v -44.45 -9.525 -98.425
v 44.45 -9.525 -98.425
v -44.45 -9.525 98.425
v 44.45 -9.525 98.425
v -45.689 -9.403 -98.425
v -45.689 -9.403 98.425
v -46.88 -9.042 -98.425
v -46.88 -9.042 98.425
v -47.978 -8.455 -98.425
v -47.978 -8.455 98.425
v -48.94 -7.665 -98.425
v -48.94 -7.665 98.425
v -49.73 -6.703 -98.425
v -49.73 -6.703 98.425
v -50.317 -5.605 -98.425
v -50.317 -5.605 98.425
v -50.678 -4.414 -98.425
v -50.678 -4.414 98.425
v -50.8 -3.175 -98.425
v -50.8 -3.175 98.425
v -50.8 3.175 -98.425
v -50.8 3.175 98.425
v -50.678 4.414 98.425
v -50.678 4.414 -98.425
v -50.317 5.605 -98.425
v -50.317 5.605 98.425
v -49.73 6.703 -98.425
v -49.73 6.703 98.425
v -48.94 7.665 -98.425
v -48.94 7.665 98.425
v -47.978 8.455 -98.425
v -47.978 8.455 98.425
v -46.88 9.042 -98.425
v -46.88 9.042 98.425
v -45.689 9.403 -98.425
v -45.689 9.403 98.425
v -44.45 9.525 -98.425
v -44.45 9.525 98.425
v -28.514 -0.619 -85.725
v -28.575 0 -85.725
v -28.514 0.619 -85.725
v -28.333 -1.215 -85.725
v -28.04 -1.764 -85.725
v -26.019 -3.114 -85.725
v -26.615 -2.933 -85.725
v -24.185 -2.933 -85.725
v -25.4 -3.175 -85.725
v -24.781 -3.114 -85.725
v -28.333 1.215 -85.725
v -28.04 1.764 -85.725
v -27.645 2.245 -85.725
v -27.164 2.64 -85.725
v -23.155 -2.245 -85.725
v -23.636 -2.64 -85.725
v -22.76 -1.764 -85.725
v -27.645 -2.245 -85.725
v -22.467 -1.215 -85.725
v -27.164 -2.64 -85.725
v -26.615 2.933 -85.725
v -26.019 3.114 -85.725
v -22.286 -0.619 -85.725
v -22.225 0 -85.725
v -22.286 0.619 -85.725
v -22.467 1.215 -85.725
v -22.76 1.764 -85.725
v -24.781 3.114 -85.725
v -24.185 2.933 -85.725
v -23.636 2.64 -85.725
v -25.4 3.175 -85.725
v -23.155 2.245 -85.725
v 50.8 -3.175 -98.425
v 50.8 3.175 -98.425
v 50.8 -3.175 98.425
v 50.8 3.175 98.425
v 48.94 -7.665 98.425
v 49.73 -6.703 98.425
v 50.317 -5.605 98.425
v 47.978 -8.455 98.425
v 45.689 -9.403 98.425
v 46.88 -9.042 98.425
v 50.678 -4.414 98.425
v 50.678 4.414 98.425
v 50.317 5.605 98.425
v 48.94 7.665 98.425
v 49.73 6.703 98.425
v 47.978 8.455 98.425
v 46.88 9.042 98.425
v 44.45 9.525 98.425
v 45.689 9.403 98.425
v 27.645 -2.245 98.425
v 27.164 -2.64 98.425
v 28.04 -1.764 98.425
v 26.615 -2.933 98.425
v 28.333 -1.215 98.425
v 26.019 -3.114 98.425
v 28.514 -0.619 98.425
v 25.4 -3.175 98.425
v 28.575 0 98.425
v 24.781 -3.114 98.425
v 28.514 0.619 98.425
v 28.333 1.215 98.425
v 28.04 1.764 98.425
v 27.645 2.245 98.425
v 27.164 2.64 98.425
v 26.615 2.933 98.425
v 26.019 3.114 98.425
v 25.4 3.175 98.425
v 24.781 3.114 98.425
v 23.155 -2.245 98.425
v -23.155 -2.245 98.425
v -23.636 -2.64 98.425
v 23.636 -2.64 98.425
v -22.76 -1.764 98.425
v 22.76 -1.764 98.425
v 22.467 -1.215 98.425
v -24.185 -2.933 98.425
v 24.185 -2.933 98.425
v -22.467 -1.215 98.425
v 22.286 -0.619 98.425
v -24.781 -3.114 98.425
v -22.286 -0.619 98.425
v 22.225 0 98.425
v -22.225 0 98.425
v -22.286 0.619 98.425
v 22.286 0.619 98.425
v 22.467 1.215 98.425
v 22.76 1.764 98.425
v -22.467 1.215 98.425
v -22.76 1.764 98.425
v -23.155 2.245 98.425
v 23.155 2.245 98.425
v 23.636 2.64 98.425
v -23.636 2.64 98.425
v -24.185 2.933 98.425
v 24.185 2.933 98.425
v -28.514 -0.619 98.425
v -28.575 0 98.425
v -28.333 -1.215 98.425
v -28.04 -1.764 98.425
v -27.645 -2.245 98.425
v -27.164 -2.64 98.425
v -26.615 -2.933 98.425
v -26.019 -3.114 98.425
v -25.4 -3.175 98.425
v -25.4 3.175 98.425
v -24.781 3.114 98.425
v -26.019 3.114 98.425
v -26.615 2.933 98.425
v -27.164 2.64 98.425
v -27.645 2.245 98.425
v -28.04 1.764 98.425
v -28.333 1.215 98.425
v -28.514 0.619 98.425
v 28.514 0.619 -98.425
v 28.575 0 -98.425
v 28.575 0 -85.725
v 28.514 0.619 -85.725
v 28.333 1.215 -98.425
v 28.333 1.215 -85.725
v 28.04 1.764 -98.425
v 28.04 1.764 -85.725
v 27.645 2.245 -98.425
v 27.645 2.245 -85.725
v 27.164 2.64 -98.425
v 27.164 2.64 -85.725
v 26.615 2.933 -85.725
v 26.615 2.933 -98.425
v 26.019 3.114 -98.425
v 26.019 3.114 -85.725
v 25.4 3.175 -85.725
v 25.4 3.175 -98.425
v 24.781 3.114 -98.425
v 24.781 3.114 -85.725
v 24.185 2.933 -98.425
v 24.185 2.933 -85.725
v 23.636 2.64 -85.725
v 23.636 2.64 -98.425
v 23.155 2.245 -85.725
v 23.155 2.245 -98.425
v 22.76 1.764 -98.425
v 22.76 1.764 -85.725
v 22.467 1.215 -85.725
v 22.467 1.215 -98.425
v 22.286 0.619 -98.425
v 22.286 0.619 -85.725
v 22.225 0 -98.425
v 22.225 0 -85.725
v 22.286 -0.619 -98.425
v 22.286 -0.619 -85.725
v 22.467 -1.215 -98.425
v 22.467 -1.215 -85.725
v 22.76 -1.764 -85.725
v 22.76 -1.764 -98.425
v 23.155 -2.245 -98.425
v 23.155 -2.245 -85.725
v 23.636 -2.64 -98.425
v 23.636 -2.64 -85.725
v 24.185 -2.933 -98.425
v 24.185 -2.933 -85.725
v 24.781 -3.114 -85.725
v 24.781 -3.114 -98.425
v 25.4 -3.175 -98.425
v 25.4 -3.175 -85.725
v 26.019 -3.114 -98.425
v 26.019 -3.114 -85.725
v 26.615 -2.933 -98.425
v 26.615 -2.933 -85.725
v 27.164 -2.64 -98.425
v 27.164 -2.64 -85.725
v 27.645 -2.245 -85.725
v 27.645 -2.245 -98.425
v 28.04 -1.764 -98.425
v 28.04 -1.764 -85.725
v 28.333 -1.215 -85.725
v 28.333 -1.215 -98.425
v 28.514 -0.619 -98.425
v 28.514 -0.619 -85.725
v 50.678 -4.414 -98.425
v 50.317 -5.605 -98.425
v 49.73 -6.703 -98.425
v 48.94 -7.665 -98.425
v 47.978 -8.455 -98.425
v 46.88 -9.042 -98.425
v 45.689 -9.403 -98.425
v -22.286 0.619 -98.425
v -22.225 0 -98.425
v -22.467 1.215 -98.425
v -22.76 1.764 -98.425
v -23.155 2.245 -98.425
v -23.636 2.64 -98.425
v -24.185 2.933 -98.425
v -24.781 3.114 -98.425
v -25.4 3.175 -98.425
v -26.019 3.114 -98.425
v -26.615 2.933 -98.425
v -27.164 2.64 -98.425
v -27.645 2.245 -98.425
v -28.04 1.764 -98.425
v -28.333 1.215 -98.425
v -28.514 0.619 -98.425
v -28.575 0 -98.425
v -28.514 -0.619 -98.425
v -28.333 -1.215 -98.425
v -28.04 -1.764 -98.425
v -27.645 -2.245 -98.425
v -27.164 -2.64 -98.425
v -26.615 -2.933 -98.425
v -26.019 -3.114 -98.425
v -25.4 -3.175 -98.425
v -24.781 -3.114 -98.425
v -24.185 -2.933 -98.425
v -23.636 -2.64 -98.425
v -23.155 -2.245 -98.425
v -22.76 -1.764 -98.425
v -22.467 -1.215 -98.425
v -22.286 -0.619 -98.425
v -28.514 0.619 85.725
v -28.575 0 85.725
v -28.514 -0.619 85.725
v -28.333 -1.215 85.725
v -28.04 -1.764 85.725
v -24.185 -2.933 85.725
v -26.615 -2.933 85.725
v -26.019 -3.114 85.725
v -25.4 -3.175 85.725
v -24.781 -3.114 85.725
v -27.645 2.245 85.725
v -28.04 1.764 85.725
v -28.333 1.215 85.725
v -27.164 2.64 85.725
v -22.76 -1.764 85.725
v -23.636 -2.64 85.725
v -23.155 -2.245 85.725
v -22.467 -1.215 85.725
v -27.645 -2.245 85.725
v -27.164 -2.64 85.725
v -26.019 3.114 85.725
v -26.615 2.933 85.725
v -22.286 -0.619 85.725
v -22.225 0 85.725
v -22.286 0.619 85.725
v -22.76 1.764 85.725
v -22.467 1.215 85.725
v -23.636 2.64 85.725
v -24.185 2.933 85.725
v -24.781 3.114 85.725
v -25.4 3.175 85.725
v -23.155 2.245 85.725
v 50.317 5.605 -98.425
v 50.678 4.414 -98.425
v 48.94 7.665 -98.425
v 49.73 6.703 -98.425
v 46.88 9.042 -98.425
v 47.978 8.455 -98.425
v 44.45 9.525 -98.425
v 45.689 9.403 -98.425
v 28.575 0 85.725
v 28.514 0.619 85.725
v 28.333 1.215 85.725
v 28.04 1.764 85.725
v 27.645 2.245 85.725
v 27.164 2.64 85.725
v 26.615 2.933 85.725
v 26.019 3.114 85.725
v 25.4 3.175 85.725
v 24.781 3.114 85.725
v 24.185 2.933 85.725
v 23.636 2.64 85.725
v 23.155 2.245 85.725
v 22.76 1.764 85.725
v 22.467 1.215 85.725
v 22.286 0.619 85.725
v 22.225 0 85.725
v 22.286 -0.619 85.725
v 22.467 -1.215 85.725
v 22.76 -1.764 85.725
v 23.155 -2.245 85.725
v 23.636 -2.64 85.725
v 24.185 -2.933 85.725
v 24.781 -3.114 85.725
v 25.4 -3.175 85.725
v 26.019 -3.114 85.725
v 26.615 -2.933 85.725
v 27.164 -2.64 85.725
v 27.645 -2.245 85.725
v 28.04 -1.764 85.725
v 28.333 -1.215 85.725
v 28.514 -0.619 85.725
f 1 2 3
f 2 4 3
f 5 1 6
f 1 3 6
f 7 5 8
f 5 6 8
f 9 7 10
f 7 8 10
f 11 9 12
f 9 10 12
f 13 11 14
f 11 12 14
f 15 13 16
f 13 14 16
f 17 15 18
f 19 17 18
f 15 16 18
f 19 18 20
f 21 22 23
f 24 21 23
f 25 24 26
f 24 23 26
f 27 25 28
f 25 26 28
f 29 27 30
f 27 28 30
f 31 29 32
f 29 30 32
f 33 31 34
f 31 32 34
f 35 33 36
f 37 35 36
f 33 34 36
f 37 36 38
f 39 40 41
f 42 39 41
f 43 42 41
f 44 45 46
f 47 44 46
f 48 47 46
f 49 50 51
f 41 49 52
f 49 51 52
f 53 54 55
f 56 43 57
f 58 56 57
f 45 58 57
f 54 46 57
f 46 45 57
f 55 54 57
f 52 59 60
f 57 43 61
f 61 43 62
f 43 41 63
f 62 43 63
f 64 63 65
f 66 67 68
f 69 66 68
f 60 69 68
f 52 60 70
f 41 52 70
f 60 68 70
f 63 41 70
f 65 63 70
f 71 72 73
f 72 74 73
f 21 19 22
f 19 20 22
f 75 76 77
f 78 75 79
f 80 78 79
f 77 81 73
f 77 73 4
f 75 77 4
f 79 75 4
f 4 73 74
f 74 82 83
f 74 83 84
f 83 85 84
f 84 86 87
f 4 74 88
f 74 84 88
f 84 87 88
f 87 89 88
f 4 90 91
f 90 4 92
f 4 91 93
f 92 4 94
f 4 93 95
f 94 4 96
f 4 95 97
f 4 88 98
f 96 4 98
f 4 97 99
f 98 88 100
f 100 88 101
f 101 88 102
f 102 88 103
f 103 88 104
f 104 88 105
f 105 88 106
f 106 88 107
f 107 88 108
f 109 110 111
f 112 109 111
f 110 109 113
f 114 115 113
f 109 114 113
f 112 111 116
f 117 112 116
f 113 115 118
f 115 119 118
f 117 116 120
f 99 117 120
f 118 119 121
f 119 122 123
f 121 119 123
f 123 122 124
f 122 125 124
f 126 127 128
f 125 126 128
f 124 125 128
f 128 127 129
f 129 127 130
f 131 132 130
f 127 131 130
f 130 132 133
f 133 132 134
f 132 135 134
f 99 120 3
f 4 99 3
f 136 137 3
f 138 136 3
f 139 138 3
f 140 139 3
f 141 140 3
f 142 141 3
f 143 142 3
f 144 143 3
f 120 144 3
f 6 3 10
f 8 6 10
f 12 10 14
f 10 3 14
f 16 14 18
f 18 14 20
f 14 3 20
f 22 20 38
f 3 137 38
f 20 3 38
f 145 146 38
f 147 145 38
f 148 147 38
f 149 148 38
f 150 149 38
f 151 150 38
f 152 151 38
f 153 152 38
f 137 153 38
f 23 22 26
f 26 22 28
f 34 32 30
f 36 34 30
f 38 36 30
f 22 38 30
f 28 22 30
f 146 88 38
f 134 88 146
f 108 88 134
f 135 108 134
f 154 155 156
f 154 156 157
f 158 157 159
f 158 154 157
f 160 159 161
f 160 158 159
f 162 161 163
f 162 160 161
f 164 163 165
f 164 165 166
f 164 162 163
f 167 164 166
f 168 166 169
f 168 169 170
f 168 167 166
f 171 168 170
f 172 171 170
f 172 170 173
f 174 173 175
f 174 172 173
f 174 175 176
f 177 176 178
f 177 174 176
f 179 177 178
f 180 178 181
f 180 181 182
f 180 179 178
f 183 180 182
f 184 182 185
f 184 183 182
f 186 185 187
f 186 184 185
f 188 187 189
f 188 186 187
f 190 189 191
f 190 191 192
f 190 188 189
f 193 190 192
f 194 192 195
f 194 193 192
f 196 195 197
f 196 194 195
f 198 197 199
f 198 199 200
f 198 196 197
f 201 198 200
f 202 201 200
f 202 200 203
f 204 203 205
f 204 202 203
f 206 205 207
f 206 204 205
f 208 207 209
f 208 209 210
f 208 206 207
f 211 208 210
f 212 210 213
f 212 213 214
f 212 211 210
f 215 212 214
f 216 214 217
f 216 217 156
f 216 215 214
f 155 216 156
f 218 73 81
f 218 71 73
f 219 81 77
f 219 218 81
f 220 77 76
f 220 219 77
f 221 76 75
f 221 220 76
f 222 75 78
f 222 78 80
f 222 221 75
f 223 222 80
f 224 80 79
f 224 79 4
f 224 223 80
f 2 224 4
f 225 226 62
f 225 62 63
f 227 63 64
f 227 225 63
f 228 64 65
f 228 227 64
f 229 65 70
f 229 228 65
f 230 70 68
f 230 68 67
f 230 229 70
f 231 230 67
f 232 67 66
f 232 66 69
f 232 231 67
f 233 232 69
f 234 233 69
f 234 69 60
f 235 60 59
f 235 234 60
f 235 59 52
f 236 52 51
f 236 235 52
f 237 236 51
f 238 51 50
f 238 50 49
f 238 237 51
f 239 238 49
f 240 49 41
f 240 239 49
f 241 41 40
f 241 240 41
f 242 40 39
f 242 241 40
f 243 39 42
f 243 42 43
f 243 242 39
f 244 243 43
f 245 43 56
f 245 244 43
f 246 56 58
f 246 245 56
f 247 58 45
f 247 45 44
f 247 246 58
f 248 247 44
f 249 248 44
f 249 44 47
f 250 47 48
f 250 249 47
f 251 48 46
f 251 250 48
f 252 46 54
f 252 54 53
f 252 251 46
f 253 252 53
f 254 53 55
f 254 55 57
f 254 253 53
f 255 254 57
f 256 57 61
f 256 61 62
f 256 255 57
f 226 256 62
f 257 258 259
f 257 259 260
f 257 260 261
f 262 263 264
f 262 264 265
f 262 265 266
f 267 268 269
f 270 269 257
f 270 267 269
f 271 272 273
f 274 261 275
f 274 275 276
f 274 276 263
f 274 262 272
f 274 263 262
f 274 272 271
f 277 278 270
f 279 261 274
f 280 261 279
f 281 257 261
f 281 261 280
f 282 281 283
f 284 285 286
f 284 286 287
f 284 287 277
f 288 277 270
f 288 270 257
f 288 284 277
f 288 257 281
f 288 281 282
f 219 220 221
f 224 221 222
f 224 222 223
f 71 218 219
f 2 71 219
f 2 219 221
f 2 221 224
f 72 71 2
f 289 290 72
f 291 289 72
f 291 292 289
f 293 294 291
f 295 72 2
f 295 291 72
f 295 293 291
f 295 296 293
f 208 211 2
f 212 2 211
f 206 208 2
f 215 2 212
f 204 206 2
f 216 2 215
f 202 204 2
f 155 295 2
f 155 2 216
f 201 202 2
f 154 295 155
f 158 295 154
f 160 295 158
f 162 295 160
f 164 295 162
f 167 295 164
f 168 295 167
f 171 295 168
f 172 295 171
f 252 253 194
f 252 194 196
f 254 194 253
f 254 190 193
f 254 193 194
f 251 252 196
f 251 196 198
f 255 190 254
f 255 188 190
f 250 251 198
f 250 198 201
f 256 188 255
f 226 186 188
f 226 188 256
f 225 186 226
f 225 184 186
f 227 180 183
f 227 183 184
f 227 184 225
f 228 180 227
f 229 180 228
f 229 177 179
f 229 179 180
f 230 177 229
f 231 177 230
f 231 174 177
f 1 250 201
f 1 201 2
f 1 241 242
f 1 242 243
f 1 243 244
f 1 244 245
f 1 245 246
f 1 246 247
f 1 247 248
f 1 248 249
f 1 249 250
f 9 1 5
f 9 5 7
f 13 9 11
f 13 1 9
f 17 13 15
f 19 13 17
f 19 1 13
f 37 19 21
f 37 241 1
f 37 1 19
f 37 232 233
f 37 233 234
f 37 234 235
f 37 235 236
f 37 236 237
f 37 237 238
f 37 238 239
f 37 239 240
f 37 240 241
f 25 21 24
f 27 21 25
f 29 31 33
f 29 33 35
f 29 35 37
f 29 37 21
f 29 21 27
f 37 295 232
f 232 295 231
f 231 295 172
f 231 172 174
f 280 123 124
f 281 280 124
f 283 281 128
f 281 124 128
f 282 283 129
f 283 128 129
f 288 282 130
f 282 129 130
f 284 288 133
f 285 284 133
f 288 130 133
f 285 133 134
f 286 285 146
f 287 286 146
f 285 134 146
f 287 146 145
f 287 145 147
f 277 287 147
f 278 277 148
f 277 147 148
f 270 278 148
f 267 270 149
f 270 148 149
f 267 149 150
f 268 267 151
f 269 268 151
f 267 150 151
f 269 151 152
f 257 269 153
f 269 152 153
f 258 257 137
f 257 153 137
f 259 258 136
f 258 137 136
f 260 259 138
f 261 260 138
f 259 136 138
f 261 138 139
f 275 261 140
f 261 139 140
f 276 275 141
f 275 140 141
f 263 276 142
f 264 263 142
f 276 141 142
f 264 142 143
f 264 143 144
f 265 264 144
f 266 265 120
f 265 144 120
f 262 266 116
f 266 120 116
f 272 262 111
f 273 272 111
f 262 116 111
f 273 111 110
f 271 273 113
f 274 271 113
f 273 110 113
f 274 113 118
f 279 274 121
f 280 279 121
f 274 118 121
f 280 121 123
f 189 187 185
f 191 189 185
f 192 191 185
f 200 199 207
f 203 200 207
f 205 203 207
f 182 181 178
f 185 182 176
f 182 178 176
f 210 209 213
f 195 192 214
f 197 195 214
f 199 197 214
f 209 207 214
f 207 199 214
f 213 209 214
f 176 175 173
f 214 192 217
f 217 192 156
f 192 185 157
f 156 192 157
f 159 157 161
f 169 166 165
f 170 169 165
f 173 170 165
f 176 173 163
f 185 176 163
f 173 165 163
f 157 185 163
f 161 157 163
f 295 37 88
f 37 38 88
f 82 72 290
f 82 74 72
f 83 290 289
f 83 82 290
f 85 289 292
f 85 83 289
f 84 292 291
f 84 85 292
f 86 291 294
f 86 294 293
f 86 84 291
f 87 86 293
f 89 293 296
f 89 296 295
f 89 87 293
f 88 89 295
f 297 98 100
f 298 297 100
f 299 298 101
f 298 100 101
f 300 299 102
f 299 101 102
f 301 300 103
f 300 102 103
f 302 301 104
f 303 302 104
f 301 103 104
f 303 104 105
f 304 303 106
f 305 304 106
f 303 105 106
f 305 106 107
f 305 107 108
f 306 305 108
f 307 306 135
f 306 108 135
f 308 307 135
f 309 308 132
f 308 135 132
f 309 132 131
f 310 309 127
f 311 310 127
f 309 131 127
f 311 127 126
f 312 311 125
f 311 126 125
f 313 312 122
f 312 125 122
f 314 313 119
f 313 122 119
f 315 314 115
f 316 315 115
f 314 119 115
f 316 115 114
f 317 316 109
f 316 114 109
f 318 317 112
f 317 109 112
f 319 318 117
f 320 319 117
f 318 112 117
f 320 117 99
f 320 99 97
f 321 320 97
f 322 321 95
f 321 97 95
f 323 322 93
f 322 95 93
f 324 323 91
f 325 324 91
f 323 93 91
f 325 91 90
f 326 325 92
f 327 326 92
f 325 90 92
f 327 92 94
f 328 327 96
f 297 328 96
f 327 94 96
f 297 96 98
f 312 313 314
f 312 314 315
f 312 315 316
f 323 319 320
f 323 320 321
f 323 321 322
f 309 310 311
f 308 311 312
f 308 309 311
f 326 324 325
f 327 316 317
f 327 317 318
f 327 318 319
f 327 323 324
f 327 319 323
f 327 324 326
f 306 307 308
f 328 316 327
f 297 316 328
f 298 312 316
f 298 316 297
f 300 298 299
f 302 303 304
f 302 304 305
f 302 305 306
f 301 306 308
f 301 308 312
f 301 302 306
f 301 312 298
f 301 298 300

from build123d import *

# Parameters (mm, degrees)
BOSS_EXTRUDE1_DEPTH = 98.425
SKETCH2_R           = 3.175
CUT_EXTRUDE1_DEPTH  = 12.7
FILLET1_R           = 6.35


with BuildPart() as part:
    # Sketch1 → Boss-Extrude1 (new body, symmetric)
    with BuildSketch(Plane.XY):
        with BuildLine():
            Line((44.45, 9.525), (50.8, 9.525))
            Line((50.8, 9.525), (50.8, 3.175))
            Line((50.8, 3.175), (50.8, -3.175))
            Line((50.8, -3.175), (50.8, -9.525))
            Line((50.8, -9.525), (44.45, -9.525))
            Line((44.45, -9.525), (-44.45, -9.525))
            ThreePointArc((-44.45, -9.525), (-48.940128061, -7.665128061), (-50.8, -3.175))
            Line((-50.8, -3.175), (-50.8, 3.175))
            ThreePointArc((-50.8, 3.175), (-48.940128061, 7.665128061), (-44.45, 9.525))
            Line((-44.45, 9.525), (44.45, 9.525))
        make_face()
    extrude(amount=BOSS_EXTRUDE1_DEPTH, both=True)

    # Sketch2 → Cut-Extrude1 (cut)
    with BuildSketch(Plane.XY.offset(98.425)):
        with Locations((-25.4, 0)):
            Circle(SKETCH2_R)
        with Locations((25.4, 0)):
            Circle(SKETCH2_R)
    cut_extrude1 = extrude(amount=-CUT_EXTRUDE1_DEPTH, mode=Mode.SUBTRACT)

    # Fillet1
    fillet1_edges = [part.edges().sort_by_distance(p)[0] for p in [
        (50.8, -9.525, 0),
        (50.8, 9.525, 0),
    ]]
    fillet(fillet1_edges, radius=FILLET1_R)

    # Mirror1: Cut-Extrude1 across plane
    add(cut_extrude1.mirror(Plane.XY), mode=Mode.SUBTRACT)


solid = part.part
